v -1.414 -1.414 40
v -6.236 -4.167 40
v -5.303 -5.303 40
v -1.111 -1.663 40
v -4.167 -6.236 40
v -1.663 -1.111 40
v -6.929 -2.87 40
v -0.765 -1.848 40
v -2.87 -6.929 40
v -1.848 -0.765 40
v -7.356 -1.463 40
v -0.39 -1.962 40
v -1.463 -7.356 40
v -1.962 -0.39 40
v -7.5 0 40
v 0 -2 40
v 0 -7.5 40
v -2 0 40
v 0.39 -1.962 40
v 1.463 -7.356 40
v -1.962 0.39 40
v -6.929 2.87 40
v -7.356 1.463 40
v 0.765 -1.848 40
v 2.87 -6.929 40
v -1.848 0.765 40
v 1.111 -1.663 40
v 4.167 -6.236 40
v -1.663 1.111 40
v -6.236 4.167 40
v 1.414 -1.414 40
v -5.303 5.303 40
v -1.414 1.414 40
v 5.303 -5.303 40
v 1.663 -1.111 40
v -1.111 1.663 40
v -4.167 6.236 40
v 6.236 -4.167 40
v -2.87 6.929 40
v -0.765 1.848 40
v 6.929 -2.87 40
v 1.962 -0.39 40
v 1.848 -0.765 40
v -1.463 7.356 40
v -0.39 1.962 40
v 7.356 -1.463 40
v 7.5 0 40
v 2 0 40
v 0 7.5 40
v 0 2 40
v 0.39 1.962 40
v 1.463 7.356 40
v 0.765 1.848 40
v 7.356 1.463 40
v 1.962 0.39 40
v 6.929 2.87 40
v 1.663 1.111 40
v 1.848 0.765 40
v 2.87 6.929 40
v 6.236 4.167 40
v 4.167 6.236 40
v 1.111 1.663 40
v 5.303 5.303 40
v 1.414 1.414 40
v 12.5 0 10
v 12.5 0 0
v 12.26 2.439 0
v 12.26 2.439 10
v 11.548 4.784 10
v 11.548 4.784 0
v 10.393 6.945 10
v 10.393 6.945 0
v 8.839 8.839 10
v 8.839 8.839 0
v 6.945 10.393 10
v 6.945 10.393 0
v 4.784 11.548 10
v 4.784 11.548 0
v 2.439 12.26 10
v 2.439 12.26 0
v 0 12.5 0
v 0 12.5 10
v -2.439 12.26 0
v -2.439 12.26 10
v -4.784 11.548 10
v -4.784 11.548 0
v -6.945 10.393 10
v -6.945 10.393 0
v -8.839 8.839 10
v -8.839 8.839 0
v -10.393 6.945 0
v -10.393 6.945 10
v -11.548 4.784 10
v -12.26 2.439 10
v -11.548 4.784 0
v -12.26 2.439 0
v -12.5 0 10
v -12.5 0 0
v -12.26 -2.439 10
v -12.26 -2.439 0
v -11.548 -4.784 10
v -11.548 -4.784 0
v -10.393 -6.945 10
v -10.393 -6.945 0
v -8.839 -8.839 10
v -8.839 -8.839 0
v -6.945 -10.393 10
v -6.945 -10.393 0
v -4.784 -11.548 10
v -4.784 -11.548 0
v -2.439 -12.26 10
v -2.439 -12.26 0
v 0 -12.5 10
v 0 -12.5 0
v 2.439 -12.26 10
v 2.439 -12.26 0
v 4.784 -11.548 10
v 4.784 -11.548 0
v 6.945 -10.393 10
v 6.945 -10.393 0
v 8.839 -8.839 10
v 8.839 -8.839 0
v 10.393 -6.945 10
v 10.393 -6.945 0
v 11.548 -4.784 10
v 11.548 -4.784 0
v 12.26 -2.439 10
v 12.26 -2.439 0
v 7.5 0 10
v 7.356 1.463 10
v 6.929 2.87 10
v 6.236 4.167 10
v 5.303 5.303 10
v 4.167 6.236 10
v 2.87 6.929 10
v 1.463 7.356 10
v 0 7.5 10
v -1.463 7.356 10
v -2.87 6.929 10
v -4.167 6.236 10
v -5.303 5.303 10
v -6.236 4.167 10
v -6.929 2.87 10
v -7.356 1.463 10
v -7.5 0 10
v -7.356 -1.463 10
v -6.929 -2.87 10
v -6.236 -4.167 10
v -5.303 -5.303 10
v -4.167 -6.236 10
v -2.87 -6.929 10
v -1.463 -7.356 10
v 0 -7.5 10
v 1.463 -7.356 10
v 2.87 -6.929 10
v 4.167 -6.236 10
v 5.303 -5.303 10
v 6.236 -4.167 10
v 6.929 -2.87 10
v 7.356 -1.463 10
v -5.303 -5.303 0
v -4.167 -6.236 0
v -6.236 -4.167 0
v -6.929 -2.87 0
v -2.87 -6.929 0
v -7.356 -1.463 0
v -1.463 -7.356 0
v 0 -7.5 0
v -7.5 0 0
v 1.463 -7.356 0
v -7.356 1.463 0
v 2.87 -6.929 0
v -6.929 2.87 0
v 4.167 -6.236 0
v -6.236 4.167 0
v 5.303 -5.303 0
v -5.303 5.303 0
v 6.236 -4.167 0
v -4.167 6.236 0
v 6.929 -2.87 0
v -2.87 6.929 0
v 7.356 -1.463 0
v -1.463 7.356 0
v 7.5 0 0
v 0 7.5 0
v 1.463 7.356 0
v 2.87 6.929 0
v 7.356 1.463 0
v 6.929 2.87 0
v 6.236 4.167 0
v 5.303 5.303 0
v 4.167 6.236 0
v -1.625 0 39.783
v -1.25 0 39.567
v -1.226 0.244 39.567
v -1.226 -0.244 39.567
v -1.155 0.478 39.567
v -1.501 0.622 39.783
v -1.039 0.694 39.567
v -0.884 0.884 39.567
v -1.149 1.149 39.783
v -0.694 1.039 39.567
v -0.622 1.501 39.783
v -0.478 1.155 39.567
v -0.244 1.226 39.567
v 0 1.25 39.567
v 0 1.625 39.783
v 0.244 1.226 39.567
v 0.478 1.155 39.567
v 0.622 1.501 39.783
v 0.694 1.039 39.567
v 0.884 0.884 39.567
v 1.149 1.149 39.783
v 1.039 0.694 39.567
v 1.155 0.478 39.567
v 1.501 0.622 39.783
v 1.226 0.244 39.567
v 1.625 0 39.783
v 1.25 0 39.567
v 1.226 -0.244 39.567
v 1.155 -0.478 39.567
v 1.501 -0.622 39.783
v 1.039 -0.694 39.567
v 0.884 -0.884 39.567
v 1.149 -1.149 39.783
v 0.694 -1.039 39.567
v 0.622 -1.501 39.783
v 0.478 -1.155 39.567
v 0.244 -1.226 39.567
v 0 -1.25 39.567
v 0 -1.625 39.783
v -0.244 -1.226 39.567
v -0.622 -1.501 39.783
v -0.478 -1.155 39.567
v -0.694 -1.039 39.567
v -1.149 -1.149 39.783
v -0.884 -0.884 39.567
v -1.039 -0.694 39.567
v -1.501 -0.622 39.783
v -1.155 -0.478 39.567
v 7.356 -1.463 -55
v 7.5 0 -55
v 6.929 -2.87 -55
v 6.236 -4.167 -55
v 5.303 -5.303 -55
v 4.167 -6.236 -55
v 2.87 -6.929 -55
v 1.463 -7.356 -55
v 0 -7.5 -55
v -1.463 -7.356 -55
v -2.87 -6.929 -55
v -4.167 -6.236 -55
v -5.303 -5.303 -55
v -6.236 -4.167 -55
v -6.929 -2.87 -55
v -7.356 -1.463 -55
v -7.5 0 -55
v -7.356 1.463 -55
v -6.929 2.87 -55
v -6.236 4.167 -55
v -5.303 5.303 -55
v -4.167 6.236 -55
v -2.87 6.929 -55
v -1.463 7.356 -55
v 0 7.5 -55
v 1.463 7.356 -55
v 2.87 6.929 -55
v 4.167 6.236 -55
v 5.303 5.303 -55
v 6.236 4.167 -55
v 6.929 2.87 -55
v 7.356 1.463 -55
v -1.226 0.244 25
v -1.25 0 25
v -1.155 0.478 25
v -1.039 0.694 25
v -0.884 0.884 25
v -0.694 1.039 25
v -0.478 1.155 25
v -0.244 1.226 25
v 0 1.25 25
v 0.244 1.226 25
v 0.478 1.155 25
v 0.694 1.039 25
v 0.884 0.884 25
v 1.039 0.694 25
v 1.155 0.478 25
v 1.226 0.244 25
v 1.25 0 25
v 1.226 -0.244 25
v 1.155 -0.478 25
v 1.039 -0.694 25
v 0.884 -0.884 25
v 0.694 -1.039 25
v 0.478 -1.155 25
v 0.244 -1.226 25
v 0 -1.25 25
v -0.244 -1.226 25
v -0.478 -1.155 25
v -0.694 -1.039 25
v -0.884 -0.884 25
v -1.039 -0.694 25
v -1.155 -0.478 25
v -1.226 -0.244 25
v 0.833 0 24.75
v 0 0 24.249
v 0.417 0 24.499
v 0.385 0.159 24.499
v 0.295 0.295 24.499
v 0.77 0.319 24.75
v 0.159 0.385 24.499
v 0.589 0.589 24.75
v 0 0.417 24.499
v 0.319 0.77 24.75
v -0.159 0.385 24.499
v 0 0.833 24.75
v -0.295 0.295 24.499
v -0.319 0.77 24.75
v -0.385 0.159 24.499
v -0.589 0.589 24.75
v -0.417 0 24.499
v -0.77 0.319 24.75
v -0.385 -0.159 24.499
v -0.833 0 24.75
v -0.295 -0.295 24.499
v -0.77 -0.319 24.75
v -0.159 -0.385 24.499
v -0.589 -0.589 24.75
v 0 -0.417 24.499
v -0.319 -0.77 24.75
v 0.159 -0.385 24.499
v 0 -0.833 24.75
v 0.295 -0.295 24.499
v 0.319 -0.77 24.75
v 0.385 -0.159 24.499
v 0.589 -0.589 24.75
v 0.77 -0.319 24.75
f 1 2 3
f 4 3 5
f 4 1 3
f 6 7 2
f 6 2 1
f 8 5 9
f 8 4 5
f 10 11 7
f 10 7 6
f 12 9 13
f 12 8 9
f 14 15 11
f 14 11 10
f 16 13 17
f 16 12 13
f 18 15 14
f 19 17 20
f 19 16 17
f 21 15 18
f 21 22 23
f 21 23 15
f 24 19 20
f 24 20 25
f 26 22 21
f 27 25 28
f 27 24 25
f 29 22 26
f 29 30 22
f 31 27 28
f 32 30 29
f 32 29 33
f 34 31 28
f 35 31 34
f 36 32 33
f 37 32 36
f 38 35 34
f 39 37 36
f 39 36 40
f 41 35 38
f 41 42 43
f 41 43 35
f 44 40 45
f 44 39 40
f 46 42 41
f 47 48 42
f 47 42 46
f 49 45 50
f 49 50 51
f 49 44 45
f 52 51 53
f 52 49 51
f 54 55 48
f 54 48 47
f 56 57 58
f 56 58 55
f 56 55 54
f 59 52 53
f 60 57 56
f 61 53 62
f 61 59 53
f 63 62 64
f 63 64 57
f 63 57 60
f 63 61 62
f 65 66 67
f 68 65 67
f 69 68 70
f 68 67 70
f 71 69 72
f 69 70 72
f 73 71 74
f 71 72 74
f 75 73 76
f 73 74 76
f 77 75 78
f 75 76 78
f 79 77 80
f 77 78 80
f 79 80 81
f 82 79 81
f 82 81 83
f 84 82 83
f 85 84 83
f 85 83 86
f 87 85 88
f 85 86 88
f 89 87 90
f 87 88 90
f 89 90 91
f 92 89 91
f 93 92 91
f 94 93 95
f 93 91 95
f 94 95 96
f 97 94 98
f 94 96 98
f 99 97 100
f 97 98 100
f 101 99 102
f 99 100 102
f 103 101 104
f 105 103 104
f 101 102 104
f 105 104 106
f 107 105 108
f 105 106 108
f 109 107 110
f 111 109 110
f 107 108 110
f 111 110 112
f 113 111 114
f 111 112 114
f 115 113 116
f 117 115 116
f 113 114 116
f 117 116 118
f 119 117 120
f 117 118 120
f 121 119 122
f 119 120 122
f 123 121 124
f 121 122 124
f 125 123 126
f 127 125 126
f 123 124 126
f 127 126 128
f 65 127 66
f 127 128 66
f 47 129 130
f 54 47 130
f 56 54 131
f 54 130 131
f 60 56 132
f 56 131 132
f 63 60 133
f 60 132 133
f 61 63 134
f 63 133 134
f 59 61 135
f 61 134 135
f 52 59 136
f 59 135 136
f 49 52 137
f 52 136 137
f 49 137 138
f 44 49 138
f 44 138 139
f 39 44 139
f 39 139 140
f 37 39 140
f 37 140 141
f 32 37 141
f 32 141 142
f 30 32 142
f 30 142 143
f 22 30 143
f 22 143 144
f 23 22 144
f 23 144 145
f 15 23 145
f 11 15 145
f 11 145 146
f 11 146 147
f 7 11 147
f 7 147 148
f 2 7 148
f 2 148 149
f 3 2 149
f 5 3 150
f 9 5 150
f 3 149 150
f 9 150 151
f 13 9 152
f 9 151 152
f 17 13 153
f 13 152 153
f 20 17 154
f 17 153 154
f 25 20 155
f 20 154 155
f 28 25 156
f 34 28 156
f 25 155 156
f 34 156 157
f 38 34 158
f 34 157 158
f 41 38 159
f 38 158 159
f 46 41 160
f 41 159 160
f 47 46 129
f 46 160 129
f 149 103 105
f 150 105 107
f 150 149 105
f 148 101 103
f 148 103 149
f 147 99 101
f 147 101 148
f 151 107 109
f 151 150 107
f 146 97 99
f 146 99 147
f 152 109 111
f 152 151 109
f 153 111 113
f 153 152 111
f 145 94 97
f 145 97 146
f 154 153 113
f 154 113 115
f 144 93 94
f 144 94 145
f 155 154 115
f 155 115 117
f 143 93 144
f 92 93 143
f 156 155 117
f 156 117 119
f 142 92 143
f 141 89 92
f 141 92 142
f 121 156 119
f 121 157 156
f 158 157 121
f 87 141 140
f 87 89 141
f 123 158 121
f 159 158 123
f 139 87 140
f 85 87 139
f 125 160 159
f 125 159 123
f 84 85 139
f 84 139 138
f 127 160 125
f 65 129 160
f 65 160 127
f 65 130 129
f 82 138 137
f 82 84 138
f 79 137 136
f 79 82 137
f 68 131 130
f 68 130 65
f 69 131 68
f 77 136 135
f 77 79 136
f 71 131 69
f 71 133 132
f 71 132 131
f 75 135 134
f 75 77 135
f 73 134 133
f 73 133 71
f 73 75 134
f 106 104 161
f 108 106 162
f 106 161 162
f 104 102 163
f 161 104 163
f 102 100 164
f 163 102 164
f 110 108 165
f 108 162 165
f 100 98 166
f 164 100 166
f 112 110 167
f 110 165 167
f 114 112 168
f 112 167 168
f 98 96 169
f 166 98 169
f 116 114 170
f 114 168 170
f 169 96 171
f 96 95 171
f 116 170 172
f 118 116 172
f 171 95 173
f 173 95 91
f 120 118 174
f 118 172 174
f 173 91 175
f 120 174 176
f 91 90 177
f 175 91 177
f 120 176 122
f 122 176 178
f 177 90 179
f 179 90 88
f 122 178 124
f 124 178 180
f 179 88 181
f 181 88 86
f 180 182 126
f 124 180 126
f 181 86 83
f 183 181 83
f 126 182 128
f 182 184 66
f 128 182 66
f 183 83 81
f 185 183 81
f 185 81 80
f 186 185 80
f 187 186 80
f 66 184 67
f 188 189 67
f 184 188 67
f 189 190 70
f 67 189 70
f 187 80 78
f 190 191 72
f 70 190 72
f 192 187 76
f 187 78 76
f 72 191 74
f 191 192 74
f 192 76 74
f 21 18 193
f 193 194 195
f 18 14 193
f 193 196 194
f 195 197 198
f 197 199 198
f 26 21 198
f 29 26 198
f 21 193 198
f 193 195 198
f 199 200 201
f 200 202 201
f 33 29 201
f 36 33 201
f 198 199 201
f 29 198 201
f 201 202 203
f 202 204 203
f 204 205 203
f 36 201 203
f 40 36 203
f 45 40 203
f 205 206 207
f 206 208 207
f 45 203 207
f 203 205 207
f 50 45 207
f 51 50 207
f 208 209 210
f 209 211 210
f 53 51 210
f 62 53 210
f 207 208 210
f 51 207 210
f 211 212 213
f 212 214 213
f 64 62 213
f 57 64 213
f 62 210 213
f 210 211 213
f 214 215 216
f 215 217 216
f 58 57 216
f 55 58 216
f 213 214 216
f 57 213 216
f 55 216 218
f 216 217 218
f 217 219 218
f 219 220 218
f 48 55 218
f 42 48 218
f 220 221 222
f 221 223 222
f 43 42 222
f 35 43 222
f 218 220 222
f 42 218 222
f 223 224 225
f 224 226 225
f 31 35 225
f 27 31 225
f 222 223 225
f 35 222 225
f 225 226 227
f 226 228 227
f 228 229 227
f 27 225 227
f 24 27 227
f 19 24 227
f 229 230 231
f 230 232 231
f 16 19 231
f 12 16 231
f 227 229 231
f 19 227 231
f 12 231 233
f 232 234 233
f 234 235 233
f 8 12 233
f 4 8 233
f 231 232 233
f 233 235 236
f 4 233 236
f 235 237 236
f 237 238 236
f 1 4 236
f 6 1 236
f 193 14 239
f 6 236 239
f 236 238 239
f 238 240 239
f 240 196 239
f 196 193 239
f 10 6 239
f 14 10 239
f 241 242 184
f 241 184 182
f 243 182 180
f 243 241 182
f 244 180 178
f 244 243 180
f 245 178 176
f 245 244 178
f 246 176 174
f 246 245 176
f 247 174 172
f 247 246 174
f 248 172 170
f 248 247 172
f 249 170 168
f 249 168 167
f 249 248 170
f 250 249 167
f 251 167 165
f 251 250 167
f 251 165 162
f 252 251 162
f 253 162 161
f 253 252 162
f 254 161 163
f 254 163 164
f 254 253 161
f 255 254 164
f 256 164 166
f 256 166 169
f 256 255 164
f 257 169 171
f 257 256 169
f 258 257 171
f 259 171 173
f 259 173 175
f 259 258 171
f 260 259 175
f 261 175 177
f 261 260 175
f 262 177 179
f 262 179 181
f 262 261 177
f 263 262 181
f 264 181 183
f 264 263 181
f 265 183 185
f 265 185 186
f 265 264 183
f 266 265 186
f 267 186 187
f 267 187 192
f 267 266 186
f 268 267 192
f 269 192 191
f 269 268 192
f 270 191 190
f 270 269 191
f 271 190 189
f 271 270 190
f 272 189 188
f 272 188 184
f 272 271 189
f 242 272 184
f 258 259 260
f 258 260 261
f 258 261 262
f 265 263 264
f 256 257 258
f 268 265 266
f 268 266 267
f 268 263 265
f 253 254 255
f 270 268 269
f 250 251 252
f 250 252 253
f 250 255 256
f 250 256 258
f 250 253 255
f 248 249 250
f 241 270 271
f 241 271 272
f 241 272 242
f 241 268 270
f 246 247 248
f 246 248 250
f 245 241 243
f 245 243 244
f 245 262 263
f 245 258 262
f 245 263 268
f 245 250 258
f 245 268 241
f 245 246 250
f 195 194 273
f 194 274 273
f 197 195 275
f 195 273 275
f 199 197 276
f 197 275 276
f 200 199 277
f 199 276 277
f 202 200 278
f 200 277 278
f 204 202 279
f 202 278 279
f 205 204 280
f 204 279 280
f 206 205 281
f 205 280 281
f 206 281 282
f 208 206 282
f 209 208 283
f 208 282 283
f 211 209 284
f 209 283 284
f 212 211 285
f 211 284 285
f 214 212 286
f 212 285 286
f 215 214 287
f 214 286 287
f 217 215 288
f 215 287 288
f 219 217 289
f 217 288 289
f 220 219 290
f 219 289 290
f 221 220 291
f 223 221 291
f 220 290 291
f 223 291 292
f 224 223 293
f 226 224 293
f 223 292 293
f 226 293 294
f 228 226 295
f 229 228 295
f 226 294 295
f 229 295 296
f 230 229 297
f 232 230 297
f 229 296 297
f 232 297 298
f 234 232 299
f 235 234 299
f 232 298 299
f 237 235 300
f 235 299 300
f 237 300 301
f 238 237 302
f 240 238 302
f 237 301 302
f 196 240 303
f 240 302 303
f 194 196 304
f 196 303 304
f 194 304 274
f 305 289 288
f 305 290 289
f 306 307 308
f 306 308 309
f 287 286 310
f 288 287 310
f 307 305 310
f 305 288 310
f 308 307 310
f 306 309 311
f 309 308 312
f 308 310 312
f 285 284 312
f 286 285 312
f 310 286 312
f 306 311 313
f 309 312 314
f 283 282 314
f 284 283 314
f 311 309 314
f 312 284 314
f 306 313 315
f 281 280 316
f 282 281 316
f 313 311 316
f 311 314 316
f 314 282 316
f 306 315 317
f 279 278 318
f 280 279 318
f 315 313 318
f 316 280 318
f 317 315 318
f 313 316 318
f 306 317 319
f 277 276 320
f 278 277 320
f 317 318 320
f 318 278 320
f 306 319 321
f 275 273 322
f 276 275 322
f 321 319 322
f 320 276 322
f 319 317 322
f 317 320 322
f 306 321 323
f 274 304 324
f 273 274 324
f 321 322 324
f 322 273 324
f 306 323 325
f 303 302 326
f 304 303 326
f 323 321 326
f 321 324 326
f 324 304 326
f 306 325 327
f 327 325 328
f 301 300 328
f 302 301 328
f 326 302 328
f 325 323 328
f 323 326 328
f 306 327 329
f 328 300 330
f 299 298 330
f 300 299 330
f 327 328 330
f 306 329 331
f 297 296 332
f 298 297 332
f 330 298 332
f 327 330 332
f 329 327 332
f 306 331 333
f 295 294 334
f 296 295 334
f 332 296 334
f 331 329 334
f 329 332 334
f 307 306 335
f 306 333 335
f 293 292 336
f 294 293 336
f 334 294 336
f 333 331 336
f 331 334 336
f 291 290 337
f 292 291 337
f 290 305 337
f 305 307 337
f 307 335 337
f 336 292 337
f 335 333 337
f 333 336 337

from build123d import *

# Parameters (mm, degrees)
SKETCH1_R                       = 12.5
F_25MM_DIA_DEPTH                = 10
F_15MM_START                    = -10
SKETCH2_R                       = 7.5
F_15MM_DIA_BEARING_END_DEPTH    = 40
F_15MM_START_2                  = 55
SKETCH3_R                       = 7.5
F_15MM_DIA_GEAR_END_DEPTH       = 55
M3X0_5_TAPPED_HOLE1_D           = 2.5
M3X0_5_TAPPED_HOLE1_DEPTH       = 15
M3X0_5_TAPPED_HOLE1_CSINK_D     = 4
M3X0_5_TAPPED_HOLE1_CSINK_ANGLE = 120
M3X0_5_TAPPED_HOLE1_TIP         = 0.751075774


with BuildPart() as part:
    # Sketch1 → 25mm dia (new body)
    with BuildSketch(Plane.XY):
        Circle(SKETCH1_R)
    extrude(amount=F_25MM_DIA_DEPTH)

    # Sketch2 → 15mm dia bearing end (add)
    with BuildSketch(Plane.XY.offset(10).offset(F_15MM_START)):
        Circle(SKETCH2_R)
    extrude(amount=F_15MM_DIA_BEARING_END_DEPTH)

    # Sketch3 → 15mm dia gear end (add)
    with BuildSketch(Plane(origin=(0, 0, 0), x_dir=(-1, 0, 0), z_dir=(0, 0, -1)).offset(F_15MM_START_2)):
        with Locations(Location((0, 0, 0), (0, 0, 180))):
            Circle(SKETCH3_R)
    extrude(amount=-F_15MM_DIA_GEAR_END_DEPTH)

    # M3x0.5 Tapped Hole1
    with Locations(Plane.XY.offset(40)):
        with Locations((0, 0)):
            CounterSinkHole(M3X0_5_TAPPED_HOLE1_D / 2, M3X0_5_TAPPED_HOLE1_CSINK_D / 2, depth=M3X0_5_TAPPED_HOLE1_DEPTH, counter_sink_angle=M3X0_5_TAPPED_HOLE1_CSINK_ANGLE)
            with Locations((0, 0, -(M3X0_5_TAPPED_HOLE1_DEPTH + M3X0_5_TAPPED_HOLE1_TIP / 2))):  # 118° drill point
                Cone(0, M3X0_5_TAPPED_HOLE1_D / 2, M3X0_5_TAPPED_HOLE1_TIP, mode=Mode.SUBTRACT)


solid = part.part
